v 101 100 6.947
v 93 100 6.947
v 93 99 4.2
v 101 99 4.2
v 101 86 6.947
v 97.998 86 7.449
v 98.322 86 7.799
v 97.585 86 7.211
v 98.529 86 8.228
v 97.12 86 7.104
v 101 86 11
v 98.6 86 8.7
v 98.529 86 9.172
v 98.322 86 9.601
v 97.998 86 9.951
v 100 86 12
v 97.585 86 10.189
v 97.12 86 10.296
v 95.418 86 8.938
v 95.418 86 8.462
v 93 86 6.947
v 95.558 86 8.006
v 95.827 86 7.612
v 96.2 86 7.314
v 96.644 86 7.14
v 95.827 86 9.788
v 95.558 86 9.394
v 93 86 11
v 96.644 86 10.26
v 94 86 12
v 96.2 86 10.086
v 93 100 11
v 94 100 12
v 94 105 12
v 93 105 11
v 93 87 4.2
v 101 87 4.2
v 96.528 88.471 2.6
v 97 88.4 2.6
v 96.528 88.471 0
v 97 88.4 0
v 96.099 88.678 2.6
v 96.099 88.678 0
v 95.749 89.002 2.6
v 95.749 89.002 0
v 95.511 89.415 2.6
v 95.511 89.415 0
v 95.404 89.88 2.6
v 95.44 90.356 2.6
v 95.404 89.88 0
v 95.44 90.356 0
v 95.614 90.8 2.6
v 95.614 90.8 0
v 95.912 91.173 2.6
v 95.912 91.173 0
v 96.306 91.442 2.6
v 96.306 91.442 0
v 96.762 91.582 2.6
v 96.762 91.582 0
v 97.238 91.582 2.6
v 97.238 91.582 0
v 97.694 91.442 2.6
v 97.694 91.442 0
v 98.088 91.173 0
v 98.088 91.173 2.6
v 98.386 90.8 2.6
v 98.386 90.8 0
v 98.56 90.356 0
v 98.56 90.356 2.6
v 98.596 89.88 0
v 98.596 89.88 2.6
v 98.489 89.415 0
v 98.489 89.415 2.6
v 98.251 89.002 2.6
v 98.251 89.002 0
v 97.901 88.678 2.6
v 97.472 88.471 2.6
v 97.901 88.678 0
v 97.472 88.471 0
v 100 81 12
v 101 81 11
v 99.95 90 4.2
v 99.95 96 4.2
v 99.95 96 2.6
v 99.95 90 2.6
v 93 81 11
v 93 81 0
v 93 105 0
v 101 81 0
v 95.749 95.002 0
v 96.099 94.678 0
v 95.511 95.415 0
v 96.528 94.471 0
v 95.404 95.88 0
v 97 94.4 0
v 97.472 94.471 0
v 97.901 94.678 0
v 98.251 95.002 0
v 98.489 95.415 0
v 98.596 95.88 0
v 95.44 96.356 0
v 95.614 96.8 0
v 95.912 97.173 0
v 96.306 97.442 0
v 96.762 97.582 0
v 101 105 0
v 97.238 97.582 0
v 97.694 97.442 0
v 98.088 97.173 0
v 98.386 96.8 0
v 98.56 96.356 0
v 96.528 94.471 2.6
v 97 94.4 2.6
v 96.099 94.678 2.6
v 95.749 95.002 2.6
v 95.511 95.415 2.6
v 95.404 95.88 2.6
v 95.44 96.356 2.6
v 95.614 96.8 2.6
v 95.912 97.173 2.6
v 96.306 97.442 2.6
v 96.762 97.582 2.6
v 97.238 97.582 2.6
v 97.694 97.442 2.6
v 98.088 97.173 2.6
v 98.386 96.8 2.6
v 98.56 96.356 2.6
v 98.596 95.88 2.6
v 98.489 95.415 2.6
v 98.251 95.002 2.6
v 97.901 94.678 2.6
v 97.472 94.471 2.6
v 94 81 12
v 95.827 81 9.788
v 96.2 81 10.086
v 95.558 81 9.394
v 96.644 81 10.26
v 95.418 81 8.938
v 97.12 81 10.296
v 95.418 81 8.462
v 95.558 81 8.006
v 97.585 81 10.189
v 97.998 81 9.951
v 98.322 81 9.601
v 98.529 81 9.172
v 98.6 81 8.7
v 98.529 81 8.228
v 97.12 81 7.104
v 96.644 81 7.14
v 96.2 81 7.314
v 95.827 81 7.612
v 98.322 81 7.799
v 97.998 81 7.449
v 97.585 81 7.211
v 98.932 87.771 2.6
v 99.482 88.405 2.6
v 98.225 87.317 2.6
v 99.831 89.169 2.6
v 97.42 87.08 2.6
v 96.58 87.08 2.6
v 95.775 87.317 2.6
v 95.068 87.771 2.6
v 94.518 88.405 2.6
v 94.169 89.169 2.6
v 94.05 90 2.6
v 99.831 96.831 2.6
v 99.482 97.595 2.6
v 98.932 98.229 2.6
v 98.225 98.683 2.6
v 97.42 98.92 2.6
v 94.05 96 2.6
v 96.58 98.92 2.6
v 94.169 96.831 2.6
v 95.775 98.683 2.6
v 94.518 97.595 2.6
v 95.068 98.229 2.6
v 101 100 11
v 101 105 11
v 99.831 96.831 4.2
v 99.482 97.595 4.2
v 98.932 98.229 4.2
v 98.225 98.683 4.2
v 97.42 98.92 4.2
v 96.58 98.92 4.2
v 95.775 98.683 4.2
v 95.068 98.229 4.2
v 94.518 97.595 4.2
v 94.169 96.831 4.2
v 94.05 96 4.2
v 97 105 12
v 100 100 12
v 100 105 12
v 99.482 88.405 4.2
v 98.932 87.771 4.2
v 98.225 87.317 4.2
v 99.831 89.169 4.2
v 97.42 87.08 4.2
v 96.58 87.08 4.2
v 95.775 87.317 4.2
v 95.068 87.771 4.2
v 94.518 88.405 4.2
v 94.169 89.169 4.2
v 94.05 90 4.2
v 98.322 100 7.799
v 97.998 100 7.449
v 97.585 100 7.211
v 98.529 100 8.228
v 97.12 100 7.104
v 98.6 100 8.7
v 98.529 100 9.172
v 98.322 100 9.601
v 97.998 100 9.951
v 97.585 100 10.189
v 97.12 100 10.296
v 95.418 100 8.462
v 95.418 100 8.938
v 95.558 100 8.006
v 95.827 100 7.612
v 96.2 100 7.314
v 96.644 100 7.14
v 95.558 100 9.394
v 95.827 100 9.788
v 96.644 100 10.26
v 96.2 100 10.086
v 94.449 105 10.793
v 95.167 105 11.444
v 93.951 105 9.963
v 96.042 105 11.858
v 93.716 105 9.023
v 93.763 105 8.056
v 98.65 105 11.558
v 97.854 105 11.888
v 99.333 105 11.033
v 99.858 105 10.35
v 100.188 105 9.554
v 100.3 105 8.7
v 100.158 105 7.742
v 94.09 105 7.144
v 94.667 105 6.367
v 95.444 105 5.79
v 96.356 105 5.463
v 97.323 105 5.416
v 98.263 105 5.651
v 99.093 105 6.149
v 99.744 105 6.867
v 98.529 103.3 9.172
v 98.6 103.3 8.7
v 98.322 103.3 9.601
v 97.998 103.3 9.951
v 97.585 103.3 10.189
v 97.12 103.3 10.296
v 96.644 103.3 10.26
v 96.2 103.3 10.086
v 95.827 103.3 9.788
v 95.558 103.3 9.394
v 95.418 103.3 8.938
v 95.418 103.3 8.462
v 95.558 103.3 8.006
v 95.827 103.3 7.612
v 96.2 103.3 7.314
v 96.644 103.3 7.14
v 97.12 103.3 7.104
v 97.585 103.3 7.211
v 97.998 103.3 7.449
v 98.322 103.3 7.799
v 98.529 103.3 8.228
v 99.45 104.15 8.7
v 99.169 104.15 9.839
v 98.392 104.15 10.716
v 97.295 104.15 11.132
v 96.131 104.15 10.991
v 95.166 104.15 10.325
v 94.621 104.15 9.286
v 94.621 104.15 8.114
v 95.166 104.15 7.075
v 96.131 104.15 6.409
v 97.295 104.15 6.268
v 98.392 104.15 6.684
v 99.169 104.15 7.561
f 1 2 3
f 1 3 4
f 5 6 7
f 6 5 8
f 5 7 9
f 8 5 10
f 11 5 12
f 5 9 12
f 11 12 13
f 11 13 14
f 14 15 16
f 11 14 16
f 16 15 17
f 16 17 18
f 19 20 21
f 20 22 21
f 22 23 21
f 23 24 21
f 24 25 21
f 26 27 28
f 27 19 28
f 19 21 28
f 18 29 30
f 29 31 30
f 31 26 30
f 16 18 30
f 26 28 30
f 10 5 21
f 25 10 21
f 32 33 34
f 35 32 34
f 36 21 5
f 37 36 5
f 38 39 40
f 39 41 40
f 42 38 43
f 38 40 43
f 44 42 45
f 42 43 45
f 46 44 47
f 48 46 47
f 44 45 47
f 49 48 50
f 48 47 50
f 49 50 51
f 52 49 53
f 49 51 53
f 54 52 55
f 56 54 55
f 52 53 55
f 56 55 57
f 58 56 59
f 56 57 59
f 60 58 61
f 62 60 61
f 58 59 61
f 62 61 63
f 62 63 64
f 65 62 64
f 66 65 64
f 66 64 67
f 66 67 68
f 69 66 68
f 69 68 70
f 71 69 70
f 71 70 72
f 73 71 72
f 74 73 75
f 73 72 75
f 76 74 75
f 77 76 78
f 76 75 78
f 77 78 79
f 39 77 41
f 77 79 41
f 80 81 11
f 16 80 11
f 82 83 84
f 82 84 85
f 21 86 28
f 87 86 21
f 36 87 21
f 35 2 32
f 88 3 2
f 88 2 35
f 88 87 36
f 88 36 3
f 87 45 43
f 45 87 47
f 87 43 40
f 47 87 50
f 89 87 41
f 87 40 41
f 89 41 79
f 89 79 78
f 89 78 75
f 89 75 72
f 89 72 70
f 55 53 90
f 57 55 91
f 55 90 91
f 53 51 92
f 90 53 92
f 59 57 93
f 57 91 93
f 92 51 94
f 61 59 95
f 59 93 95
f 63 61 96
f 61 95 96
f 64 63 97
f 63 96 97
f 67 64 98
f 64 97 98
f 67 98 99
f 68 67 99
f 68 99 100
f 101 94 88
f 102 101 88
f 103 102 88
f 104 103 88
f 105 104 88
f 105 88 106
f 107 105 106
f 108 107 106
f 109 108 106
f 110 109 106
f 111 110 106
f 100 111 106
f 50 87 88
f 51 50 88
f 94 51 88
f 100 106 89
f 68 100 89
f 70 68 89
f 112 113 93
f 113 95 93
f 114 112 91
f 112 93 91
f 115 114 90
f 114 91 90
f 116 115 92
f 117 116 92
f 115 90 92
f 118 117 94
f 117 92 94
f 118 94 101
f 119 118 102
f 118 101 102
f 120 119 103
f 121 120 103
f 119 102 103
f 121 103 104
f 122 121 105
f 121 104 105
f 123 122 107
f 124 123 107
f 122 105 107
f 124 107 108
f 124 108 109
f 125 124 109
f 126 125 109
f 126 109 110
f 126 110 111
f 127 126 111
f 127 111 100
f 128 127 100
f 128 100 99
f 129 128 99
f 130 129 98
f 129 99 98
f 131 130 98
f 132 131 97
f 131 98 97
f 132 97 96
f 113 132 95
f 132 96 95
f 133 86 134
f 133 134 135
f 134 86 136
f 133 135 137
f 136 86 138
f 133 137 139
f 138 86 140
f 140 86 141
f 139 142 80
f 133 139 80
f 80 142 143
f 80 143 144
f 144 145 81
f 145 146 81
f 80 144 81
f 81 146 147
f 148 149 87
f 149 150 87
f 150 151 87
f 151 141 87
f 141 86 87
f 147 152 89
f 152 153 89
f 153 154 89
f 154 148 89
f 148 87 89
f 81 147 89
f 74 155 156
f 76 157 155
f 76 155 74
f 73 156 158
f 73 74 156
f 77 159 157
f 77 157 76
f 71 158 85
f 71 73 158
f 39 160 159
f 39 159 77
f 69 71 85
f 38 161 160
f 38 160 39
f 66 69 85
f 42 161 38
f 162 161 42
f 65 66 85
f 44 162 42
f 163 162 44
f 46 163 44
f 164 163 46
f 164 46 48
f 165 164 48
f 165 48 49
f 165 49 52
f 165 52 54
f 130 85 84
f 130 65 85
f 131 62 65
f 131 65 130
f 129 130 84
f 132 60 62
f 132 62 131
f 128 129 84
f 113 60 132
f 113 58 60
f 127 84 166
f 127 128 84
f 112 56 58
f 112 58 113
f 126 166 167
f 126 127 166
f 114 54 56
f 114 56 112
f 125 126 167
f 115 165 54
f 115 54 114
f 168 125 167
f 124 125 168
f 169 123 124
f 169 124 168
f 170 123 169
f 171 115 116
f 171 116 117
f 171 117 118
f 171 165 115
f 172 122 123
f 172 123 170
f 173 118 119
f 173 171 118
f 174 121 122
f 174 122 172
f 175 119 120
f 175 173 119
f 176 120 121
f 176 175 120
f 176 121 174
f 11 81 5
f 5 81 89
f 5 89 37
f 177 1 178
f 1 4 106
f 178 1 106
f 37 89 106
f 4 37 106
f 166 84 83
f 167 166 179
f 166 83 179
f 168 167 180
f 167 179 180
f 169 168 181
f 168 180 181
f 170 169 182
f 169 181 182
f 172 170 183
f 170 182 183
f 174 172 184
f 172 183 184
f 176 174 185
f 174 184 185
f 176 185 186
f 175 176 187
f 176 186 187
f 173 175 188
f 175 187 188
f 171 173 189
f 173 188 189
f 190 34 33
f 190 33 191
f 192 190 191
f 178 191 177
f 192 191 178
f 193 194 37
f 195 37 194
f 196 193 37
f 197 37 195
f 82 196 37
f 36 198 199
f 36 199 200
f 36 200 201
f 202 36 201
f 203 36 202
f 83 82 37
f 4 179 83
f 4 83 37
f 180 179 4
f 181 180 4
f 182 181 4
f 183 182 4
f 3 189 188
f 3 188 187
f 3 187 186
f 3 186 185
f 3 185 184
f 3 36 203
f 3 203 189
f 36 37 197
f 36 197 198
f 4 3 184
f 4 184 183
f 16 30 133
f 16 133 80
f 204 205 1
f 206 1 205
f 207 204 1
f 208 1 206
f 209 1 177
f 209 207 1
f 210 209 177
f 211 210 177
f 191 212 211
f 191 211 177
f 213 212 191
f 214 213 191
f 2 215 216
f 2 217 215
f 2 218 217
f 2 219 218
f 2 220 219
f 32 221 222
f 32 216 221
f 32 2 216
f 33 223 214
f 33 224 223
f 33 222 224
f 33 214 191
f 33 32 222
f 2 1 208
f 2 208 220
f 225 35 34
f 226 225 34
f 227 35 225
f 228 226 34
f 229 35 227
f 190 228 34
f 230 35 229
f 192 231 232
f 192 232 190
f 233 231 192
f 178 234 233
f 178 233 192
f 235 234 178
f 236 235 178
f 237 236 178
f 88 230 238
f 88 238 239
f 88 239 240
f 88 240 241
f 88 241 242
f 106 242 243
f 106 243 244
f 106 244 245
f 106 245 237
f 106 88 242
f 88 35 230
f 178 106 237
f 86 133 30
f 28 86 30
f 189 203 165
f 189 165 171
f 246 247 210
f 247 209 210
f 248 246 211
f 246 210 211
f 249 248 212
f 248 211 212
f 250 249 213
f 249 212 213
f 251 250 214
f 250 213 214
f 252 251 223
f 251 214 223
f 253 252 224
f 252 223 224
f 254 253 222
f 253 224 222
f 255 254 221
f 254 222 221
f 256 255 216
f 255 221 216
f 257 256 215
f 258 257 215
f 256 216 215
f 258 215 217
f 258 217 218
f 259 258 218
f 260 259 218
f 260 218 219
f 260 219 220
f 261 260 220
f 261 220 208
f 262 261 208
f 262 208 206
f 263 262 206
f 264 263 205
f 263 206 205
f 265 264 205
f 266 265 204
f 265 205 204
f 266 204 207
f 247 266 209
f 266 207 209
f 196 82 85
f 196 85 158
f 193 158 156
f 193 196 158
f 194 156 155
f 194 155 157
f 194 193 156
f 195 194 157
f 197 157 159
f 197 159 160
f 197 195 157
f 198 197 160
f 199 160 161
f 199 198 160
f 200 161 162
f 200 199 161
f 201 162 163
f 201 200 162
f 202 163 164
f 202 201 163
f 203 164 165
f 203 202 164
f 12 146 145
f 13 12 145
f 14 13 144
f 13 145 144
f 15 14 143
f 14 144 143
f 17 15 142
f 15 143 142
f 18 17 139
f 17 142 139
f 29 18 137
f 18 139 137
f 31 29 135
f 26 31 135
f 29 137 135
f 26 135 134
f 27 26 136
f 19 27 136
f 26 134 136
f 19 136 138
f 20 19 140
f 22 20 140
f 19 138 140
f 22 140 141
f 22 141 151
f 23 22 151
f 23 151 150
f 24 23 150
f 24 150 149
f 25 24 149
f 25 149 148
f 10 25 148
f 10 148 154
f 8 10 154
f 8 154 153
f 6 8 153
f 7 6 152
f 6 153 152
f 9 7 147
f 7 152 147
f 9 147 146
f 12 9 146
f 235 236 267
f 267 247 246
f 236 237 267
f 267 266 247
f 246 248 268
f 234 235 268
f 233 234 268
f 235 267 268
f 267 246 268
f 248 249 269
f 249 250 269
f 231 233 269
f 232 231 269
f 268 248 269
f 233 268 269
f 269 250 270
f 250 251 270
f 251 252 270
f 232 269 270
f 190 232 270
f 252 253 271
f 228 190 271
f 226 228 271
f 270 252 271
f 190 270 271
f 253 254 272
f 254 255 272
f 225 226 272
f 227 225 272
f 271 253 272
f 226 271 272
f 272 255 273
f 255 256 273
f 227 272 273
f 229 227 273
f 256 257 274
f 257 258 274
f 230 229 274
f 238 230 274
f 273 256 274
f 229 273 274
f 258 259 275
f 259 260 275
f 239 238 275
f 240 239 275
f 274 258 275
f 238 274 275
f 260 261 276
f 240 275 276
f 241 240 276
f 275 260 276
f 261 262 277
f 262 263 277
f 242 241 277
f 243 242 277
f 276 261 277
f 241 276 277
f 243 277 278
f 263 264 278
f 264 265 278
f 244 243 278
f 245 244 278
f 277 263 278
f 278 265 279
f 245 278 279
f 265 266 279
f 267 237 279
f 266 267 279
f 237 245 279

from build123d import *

# Parameters (mm, degrees)
SKETCH_2_W                   = 8
SKETCH_2_H                   = 24
EXTRUDE_1_DEPTH              = 12
SKETCH_3_W                   = 9.180468112
SKETCH_3_H                   = 14
CUT_EXTRUDE_1_DEPTH          = 40
CHAMFER_1_SIZE               = 1
CHAMFER_1_SIZE2              = 2.747477419
HOLE_WIZARD_M3_1_D           = 3.2
HOLE_WIZARD_M3_1_CBORE_D     = 5.9
HOLE_WIZARD_M3_1_CBORE_DEPTH = 1.6
CUT_EXTRUDE_2_DEPTH          = 1.6
HOLE_WIZARD_1767_D           = 3.2
HOLE_WIZARD_1767_DEPTH       = 24
HOLE_WIZARD_1767_CSINK_D     = 6.6
HOLE_WIZARD_1767_CSINK_ANGLE = 90
HOLE_WIZARD_1767_TIP         = 0.96137699
CHAMFER_2_SIZE               = 1


with BuildPart() as part:
    # 草图2 → 凸台-拉伸1 (new body)
    with BuildSketch(Plane.XY):
        with Locations((97, 93)):
            Rectangle(SKETCH_2_W, SKETCH_2_H)
    extrude(amount=EXTRUDE_1_DEPTH)

    # 草图3 → 切除-拉伸1 (cut)
    with BuildSketch(Plane.ZY.offset(-93)):
        with Locations((8.790234056, 93)):
            Rectangle(SKETCH_3_W, SKETCH_3_H)
    extrude(amount=-CUT_EXTRUDE_1_DEPTH, mode=Mode.SUBTRACT)

    # 倒角1
    chamfer_1_edges = [part.edges().sort_by_distance(p)[0] for p in [
        (97, 86, 4.2),
        (97, 100, 4.2),
    ]]
    chamfer_1_side = [part.faces().sort_by_distance(p)[0] for p in [
        (97, 93, 4.2),
    ]]
    chamfer(chamfer_1_edges, length=CHAMFER_1_SIZE, length2=CHAMFER_1_SIZE2, reference=chamfer_1_side[0])

    # M3 六角头螺栓的柱形沉头孔1 (through all)
    with Locations(Plane(origin=(124.363861944, -131.010130877, 4.2), x_dir=(0, 1, 0), z_dir=(0, 0, 1))):
        with Locations((221.010130877, 27.363861944), (227.010130877, 27.363861944)):
            CounterBoreHole(HOLE_WIZARD_M3_1_D / 2, HOLE_WIZARD_M3_1_CBORE_D / 2, HOLE_WIZARD_M3_1_CBORE_DEPTH)

    # 草图11 → 切除-拉伸2 (cut)
    with BuildSketch(Plane.XY.offset(4.2)):
        with BuildLine():
            Line((94.05, 90), (94.05, 96))
            ThreePointArc((94.05, 96), (97, 98.95), (99.95, 96))
            Line((99.95, 96), (99.95, 90))
            ThreePointArc((99.95, 90), (97, 87.05), (94.05, 90))
        make_face()
    extrude(amount=-CUT_EXTRUDE_2_DEPTH, mode=Mode.SUBTRACT)

    # Hole Wizard 1767
    with Locations(Plane(origin=(124.363861944, 105, -5), x_dir=(-1, 0, 0), z_dir=(0, 1, 0))):
        with Locations((27.363861944, 13.7)):
            CounterSinkHole(HOLE_WIZARD_1767_D / 2, HOLE_WIZARD_1767_CSINK_D / 2, depth=HOLE_WIZARD_1767_DEPTH, counter_sink_angle=HOLE_WIZARD_1767_CSINK_ANGLE)
            with Locations((0, 0, -(HOLE_WIZARD_1767_DEPTH + HOLE_WIZARD_1767_TIP / 2))):  # 118° drill point
                Cone(0, HOLE_WIZARD_1767_D / 2, HOLE_WIZARD_1767_TIP, mode=Mode.SUBTRACT)

    # 倒角2
    chamfer_2_edges = [part.edges().sort_by_distance(p)[0] for p in [
        (93, 102.5, 12),
        (101, 102.5, 12),
        (93, 83.5, 12),
        (101, 83.5, 12),
    ]]
    chamfer(chamfer_2_edges, length=CHAMFER_2_SIZE)


solid = part.part
